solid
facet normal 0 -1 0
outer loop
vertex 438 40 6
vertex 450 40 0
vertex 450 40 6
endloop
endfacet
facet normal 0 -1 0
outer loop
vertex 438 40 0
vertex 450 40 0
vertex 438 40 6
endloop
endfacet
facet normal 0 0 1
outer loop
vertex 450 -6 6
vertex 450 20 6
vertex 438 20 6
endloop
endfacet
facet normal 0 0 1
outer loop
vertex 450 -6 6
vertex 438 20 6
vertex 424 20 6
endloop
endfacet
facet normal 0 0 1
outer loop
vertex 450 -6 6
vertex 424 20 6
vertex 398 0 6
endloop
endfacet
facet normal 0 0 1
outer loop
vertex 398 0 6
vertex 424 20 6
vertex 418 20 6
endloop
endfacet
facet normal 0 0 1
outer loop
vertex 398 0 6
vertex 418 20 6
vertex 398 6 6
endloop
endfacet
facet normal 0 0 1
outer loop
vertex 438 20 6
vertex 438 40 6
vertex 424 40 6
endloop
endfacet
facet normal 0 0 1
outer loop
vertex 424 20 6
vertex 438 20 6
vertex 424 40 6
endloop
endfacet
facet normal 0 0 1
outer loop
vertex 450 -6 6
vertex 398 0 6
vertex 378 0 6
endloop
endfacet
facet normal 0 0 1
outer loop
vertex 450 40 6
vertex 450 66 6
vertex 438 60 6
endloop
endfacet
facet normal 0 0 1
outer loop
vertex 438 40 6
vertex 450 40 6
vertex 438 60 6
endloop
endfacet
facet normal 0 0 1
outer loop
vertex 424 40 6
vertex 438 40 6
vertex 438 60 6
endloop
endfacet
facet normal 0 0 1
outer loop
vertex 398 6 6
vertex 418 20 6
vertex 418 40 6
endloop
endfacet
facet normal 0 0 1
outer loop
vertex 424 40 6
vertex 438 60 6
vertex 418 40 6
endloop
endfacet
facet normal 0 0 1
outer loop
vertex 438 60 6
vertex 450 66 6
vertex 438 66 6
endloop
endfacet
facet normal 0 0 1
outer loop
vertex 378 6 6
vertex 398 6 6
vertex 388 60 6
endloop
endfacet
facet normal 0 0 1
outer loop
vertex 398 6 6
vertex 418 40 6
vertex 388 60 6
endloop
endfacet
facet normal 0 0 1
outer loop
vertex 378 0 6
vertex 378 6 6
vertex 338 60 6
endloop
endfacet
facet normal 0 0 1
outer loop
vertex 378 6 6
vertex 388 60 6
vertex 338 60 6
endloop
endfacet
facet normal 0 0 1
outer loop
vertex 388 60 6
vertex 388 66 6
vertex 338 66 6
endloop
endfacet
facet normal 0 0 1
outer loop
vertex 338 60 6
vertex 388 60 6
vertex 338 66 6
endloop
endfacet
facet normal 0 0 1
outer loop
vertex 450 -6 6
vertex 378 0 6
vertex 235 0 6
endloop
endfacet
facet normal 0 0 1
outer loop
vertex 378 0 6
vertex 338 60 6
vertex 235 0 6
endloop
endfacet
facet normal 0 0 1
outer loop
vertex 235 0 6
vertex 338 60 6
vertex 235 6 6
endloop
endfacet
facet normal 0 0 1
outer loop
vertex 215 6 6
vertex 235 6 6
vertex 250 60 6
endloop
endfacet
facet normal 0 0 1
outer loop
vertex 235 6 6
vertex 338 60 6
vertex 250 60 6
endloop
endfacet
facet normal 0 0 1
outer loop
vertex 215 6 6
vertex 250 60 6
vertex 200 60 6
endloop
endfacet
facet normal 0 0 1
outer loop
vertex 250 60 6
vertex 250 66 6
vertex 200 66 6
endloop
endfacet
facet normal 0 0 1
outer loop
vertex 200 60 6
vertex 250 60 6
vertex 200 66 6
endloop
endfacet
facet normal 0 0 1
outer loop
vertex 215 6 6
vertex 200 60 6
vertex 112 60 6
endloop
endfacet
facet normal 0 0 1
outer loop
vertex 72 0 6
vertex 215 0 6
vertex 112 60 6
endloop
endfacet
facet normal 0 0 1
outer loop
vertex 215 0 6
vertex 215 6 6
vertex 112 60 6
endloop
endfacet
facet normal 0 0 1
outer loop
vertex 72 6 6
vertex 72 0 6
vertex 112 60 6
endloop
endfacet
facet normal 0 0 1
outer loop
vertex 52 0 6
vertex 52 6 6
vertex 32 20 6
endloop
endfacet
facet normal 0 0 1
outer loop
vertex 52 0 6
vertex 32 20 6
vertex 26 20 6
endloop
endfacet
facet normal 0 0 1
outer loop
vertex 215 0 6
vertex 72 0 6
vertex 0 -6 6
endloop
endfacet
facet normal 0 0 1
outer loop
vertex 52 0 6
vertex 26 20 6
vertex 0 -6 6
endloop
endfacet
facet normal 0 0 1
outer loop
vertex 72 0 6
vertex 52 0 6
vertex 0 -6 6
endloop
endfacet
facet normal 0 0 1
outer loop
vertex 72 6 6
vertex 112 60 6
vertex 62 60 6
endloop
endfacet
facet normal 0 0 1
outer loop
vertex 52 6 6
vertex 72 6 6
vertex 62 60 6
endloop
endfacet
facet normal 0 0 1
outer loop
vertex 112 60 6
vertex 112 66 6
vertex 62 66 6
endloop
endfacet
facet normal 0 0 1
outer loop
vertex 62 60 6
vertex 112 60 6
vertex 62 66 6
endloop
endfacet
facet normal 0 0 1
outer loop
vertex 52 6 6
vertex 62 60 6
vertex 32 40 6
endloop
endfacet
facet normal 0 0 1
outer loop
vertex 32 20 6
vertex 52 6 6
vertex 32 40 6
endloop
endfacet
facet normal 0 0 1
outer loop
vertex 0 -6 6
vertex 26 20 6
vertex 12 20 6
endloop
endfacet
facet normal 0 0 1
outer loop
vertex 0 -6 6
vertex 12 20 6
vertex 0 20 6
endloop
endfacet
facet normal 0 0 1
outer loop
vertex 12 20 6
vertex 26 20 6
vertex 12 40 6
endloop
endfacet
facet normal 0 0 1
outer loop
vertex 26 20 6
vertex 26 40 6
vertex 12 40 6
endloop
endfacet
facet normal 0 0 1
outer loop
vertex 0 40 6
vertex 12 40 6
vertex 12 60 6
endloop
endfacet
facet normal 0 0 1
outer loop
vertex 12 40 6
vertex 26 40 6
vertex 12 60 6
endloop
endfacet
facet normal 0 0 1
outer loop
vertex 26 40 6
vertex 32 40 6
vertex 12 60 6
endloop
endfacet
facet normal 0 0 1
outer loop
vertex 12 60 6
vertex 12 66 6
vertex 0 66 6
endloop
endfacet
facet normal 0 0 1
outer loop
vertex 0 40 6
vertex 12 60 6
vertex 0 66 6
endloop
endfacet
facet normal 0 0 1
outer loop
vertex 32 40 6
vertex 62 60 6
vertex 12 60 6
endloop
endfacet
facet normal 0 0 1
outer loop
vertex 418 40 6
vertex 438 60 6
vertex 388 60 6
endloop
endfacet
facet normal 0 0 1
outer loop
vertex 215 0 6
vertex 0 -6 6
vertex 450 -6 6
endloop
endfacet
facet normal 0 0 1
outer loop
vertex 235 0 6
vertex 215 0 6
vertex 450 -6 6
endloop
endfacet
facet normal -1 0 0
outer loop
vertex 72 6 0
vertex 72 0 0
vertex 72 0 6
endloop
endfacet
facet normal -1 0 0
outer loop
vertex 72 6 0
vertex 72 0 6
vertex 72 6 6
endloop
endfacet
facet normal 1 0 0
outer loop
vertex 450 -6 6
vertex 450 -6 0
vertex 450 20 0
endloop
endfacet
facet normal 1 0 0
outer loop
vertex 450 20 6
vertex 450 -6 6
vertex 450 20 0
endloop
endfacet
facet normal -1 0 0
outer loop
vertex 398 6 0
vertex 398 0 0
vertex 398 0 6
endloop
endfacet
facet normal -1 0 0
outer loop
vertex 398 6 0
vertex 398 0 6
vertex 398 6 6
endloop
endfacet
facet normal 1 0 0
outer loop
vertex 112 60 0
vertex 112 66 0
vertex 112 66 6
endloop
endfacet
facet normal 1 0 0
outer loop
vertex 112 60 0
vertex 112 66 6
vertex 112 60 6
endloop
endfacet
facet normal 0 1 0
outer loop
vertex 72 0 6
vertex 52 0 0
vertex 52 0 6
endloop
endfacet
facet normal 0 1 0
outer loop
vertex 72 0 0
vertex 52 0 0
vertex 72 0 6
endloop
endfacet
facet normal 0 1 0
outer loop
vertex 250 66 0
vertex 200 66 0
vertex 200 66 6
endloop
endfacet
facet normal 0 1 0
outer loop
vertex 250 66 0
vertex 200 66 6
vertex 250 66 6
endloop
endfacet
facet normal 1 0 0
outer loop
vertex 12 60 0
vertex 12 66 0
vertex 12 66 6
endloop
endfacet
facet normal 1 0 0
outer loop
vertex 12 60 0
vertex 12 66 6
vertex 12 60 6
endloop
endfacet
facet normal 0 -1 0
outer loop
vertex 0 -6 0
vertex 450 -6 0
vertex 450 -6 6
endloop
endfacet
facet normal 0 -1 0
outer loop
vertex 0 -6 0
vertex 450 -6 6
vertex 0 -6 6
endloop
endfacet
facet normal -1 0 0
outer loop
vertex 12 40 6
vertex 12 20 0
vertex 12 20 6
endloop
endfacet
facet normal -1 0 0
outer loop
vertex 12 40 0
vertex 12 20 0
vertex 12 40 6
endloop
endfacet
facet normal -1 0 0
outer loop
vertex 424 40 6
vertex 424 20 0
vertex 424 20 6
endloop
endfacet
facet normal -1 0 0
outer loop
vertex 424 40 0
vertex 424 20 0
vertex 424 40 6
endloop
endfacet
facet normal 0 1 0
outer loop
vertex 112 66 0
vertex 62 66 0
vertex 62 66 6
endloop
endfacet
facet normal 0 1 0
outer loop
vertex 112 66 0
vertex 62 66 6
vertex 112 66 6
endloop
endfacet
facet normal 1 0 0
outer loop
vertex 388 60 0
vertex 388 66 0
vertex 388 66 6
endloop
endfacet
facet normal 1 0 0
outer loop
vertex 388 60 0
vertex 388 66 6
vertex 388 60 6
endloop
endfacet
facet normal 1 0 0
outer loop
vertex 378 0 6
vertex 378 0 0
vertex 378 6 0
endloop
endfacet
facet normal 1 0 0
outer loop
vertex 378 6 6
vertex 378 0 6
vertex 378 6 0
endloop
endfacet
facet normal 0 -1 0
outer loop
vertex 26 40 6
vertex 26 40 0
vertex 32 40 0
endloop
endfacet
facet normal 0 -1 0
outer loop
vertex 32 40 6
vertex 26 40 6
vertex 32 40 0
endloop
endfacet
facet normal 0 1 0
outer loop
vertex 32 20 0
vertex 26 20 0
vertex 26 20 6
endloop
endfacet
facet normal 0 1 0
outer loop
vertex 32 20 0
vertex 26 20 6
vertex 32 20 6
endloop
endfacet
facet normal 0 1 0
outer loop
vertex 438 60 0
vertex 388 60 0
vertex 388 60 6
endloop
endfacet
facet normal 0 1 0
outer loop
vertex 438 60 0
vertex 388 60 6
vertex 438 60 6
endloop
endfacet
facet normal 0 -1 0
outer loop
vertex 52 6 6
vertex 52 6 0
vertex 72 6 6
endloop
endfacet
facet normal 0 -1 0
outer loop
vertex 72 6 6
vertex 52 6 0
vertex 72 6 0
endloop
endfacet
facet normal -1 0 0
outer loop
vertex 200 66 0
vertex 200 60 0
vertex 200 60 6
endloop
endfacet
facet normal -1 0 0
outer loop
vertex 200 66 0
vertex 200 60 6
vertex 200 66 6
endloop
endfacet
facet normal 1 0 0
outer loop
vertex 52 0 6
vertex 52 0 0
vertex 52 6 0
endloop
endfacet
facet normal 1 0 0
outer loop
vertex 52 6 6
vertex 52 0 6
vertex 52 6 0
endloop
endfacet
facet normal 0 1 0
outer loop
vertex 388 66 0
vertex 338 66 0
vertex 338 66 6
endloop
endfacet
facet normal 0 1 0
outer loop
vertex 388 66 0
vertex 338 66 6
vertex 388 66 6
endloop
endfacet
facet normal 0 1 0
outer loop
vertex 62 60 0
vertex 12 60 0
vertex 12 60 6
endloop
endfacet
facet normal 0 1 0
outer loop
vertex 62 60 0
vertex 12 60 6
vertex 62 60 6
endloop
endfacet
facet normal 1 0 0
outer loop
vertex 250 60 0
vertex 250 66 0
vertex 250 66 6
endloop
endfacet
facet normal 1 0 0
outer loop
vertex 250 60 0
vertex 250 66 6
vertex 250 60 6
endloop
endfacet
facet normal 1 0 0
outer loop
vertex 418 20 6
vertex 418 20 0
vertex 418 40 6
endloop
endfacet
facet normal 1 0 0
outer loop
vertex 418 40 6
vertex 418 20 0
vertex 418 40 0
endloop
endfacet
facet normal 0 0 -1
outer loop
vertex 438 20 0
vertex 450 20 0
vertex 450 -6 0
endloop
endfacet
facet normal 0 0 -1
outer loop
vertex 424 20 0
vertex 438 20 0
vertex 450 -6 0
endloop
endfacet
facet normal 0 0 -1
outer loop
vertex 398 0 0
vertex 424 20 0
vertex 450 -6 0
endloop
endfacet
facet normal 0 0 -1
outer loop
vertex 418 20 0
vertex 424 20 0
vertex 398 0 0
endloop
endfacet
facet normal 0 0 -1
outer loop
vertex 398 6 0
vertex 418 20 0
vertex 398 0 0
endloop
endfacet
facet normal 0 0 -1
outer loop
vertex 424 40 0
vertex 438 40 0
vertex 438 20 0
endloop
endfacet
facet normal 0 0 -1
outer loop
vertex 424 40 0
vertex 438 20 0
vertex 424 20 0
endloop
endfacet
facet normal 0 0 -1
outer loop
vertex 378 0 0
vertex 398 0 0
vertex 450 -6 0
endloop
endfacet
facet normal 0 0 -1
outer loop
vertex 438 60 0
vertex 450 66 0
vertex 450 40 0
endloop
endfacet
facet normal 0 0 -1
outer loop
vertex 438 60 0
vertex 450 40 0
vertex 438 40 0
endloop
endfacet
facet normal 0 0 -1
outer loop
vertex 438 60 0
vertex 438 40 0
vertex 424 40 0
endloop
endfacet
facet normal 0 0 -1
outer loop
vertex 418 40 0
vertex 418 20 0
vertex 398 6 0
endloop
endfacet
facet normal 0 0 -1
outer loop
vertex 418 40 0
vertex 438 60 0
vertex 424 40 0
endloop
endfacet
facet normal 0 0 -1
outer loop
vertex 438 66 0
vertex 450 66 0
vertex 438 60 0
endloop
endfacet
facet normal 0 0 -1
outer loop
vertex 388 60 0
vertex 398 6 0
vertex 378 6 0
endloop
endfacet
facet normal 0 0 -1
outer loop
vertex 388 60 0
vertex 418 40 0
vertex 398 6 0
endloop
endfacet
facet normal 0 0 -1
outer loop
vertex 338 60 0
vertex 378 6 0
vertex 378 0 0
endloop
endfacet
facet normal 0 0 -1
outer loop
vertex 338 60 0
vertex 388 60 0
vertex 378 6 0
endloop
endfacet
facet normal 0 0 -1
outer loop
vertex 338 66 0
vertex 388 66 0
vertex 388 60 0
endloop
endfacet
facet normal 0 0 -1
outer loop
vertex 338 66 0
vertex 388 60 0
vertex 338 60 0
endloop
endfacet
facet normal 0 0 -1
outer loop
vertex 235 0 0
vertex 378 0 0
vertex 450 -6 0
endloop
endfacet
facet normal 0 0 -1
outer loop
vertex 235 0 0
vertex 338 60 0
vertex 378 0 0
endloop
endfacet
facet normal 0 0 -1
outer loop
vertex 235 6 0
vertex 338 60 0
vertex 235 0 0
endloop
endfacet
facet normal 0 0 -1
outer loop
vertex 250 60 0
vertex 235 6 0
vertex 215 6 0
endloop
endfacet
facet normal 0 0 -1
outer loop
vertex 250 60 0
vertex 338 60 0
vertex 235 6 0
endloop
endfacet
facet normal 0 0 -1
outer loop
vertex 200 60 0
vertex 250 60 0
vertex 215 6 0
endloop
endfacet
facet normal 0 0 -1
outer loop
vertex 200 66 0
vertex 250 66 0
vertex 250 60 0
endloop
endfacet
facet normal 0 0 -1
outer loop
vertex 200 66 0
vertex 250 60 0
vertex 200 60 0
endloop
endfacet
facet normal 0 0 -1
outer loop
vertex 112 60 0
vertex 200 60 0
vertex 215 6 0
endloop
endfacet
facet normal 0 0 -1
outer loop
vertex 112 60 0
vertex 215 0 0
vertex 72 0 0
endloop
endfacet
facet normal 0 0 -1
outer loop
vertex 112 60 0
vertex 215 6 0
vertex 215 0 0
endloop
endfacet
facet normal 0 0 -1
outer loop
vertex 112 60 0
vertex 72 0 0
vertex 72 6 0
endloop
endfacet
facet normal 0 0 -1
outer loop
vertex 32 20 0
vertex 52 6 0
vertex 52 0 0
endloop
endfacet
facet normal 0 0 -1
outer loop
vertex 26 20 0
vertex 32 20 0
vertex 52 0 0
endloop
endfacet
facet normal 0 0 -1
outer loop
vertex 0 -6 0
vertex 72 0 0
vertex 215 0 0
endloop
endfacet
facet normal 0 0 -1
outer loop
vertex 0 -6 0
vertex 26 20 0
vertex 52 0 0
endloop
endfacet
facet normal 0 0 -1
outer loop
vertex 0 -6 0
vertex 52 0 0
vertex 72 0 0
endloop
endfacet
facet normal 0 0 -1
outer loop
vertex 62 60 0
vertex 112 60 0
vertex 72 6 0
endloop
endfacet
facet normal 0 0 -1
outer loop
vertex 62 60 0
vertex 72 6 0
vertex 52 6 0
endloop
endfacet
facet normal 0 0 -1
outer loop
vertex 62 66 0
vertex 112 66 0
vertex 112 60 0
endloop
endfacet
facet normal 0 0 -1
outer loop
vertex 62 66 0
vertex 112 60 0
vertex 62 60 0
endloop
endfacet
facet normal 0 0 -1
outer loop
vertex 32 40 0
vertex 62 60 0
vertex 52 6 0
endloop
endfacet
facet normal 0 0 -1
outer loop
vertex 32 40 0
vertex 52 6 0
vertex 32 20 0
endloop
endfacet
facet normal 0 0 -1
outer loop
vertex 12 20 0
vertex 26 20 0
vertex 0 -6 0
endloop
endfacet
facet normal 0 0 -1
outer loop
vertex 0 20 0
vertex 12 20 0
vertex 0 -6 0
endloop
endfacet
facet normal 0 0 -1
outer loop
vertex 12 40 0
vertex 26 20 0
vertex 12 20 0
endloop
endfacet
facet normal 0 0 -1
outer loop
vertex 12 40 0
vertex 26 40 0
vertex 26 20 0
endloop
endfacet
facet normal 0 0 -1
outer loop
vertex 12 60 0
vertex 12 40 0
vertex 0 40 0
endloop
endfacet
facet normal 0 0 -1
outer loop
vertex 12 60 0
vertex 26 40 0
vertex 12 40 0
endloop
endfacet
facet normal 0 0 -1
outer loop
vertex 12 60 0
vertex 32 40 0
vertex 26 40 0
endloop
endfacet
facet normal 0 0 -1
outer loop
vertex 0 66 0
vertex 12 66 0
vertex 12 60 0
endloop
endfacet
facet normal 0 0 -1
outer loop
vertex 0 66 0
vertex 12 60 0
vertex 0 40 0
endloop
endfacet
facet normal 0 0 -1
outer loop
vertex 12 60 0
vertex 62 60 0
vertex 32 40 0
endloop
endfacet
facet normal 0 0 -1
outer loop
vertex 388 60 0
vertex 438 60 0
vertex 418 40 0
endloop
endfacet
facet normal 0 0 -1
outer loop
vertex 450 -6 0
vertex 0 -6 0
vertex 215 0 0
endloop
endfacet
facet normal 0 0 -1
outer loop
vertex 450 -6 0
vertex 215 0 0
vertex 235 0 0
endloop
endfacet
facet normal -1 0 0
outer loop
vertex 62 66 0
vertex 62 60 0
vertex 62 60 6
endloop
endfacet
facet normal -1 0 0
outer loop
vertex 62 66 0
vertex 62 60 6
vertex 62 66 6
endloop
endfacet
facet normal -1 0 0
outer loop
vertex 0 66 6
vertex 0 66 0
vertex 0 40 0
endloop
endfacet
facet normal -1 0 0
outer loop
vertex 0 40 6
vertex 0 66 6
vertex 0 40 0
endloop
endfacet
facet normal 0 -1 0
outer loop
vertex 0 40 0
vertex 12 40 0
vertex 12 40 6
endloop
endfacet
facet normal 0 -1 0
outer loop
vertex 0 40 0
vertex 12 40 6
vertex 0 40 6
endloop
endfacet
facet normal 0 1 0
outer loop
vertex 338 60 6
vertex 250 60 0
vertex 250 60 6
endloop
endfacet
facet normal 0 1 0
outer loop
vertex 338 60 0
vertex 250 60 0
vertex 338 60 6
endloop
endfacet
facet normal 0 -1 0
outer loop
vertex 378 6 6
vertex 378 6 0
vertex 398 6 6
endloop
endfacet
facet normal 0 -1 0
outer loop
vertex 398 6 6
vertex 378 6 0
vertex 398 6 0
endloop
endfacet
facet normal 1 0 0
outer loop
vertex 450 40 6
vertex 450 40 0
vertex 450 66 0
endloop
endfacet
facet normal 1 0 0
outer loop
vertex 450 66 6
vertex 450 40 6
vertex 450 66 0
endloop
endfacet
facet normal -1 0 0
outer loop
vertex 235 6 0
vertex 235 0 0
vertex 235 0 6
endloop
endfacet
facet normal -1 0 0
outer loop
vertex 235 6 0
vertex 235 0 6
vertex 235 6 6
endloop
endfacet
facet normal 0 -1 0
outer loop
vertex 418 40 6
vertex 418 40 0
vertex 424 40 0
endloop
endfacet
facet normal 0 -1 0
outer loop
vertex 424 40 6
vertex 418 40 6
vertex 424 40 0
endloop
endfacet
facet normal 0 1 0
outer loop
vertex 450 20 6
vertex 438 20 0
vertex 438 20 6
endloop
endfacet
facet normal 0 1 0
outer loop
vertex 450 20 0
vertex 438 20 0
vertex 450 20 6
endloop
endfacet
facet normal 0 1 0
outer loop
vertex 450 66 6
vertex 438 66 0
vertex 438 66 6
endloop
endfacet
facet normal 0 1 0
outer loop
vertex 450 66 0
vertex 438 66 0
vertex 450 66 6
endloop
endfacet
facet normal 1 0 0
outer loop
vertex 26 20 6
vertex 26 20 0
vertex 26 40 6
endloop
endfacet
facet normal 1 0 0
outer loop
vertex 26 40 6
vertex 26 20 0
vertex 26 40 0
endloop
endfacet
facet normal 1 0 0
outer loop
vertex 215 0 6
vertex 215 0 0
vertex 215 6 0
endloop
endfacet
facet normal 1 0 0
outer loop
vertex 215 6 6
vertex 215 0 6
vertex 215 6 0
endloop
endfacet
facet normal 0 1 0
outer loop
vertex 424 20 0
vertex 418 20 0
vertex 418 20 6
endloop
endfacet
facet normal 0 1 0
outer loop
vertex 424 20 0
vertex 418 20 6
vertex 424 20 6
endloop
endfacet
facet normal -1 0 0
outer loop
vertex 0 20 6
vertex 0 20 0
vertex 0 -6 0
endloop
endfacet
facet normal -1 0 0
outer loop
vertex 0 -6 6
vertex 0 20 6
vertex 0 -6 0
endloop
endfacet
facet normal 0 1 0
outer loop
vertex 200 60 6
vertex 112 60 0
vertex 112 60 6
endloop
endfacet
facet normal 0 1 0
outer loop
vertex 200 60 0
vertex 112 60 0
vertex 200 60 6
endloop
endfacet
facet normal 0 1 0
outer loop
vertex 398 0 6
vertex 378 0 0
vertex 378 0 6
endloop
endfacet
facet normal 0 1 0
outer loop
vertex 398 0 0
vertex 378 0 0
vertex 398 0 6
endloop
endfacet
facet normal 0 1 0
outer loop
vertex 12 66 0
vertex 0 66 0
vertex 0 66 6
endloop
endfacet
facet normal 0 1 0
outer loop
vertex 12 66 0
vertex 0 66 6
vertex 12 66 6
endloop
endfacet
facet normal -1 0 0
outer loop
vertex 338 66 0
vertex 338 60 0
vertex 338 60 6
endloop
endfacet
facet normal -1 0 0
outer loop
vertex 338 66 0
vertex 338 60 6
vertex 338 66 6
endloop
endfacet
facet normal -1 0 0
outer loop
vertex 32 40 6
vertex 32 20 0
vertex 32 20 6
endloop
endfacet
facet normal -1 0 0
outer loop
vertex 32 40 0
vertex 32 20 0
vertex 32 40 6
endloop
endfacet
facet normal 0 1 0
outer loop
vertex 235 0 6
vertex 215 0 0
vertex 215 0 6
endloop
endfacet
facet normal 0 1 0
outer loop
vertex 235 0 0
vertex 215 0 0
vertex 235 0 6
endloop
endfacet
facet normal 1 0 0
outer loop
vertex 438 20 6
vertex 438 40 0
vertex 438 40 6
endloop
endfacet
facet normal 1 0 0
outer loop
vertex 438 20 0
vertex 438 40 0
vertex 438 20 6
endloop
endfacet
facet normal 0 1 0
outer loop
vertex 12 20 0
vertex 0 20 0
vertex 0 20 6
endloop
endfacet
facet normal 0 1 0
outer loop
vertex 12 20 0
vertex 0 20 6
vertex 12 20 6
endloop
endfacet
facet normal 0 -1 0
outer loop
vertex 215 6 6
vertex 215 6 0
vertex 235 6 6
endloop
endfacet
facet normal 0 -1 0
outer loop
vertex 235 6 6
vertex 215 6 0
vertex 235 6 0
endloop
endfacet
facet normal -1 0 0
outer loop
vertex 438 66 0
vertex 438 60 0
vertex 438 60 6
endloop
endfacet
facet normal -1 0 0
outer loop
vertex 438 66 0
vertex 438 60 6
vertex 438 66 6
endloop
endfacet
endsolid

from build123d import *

# Parameters (mm, degrees)
SKETCH_1_W      = 20
SKETCH_1_H      = 6
SKETCH_1_W_2    = 6
SKETCH_1_H_2    = 20
EXTRUDE_1_DEPTH = 6


with BuildPart() as part:
    # Эскиз1 → Бобышка-Вытянуть1 (new body)
    with BuildSketch(Plane.XY):
        Polygon((0, 60), (0, 66), (12, 66), (12, 60), (62, 60), (62, 66), (112, 66), (112, 60), (200, 60), (200, 66), (250, 66), (250, 60), (338, 60), (338, 66), (388, 66), (388, 60), (438, 60), (438, 66), (450, 66), (450, 60), (450, 40), (438, 40), (438, 20), (450, 20), (450, 0), (450, -6), (0, -6), (0, 0), (0, 20), (12, 20), (12, 40), (0, 40), align=None)
        with Locations((62, 3)):
            Rectangle(SKETCH_1_W, SKETCH_1_H, mode=Mode.SUBTRACT)
        with Locations((225, 3)):
            Rectangle(SKETCH_1_W, SKETCH_1_H, mode=Mode.SUBTRACT)
        with Locations((388, 3)):
            Rectangle(SKETCH_1_W, SKETCH_1_H, mode=Mode.SUBTRACT)
        with Locations((29, 30)):
            Rectangle(SKETCH_1_W_2, SKETCH_1_H_2, mode=Mode.SUBTRACT)
        with Locations((421, 30)):
            Rectangle(SKETCH_1_W_2, SKETCH_1_H_2, mode=Mode.SUBTRACT)
    extrude(amount=EXTRUDE_1_DEPTH)


solid = part.part
